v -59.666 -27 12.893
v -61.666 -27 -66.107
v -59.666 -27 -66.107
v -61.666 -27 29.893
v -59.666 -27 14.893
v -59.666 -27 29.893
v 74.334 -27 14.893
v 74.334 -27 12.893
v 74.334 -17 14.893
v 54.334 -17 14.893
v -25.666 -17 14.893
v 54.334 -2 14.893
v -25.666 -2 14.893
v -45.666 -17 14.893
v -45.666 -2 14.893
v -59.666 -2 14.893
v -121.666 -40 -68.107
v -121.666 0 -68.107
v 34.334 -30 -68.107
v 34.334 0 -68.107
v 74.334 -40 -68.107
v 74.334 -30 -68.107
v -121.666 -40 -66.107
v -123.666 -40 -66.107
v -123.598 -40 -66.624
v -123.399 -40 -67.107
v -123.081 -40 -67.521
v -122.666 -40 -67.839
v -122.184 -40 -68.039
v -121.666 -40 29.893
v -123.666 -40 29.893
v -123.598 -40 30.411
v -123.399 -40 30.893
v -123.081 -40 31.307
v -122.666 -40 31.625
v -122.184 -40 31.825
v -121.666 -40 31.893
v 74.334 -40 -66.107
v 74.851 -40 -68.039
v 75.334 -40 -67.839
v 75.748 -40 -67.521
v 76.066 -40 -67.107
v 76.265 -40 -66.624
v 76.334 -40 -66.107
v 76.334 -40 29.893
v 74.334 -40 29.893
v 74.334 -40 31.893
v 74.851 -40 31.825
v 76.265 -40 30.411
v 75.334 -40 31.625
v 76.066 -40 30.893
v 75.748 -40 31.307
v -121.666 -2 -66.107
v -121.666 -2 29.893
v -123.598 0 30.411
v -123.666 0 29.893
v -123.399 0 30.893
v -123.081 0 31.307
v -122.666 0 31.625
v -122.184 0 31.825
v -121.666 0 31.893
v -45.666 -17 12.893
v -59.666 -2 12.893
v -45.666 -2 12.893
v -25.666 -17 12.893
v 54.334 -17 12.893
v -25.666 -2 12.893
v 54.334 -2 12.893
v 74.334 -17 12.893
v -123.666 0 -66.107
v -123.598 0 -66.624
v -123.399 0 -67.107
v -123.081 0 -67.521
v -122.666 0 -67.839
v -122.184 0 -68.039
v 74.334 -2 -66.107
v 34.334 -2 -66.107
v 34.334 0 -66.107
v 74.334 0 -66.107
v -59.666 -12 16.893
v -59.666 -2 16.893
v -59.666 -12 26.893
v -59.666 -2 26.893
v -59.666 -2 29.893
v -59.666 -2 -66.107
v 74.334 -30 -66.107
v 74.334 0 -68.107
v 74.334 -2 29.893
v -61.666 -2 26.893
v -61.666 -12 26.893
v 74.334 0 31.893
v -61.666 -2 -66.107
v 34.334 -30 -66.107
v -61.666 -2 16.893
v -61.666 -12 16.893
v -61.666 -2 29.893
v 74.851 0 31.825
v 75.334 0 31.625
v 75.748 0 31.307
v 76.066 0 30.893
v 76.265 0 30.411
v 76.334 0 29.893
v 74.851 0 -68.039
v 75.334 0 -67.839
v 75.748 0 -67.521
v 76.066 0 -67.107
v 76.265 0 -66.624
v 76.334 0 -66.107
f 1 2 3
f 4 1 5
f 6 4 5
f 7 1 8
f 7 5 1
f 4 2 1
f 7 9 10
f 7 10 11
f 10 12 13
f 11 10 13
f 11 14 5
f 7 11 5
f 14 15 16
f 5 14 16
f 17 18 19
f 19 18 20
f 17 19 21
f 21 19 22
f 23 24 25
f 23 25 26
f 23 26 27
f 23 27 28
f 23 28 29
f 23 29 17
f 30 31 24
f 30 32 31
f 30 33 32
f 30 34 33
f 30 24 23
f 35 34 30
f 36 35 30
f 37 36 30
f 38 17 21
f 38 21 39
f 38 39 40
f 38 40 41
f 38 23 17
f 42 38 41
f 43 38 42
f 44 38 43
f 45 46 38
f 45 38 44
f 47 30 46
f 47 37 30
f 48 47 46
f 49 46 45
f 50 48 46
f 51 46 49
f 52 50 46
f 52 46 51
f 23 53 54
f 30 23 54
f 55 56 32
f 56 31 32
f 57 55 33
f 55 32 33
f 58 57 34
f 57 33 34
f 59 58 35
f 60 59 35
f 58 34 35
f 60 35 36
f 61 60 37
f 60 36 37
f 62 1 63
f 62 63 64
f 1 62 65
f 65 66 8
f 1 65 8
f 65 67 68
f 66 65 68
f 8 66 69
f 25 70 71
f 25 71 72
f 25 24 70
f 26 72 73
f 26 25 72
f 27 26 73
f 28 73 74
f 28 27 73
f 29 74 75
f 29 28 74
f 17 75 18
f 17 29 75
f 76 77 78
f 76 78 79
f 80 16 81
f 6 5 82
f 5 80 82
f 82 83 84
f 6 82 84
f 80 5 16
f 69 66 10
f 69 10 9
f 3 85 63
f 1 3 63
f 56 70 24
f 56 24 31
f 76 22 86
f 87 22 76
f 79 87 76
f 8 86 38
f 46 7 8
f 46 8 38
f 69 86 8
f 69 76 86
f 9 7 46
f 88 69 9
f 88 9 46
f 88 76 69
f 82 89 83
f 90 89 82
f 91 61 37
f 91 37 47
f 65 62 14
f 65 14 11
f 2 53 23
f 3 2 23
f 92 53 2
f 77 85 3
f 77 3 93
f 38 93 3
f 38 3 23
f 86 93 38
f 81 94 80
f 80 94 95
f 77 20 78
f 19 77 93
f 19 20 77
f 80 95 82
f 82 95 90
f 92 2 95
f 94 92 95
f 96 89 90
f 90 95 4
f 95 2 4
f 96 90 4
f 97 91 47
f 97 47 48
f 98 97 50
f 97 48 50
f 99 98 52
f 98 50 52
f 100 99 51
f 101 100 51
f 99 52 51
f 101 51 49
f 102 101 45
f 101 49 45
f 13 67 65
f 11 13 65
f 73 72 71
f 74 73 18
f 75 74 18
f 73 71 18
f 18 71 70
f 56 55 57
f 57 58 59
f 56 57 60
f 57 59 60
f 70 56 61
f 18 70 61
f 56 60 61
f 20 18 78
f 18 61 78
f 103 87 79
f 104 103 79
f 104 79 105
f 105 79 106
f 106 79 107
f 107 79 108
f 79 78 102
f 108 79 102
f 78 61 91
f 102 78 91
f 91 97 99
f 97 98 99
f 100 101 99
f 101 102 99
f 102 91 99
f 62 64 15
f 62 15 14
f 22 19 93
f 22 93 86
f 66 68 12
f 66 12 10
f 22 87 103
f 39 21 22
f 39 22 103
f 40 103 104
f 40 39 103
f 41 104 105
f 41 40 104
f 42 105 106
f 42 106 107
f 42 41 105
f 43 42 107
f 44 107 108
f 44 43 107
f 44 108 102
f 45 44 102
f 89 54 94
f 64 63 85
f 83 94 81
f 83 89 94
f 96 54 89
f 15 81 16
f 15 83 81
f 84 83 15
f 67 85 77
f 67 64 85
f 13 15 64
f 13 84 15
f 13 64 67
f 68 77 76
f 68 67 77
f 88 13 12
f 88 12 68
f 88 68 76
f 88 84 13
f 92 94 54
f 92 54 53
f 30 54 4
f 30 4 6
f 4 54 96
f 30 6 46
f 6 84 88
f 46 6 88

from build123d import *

# Parameters (mm, degrees)
F0_W      = 200
F0_H      = 100
F0_W_2    = 196
F0_H_2    = 96
F1_DEPTH  = 40
F2_DEPTH  = 2
F3_W      = 62
F3_H      = 96
F4_DEPTH  = 25
F5_W      = 60
F5_H      = 96
F6_DEPTH  = 25
F8_DEPTH  = 25
F9_W      = 14
F9_H      = 10
F10_DEPTH = 5
F12_W     = 10
F12_H     = 10
F13_DEPTH = 5
F14_R     = 2
F15_W     = 20
F15_H     = 15
F16_DEPTH = 2
F17_W     = 15
F17_H     = 10
F18_DEPTH = 2
F19_W     = 86
F19_H     = 2
F20_DEPTH = 25
F21_W     = 25
F21_H     = 15
F22_DEPTH = 88
F23_W     = 40
F23_H     = 30
F24_DEPTH = 2
F25_W     = 20
F25_H     = 15
F26_DEPTH = 2


with BuildPart() as f1:
    # F0 (on Front) → F1 (new body)
    with BuildSketch(Plane.XZ):
        with Locations((-23.666499, -18.106852)):
            Rectangle(F0_W, F0_H)
        with Locations((-23.666499, -18.106852)):
            Rectangle(F0_W_2, F0_H_2, mode=Mode.SUBTRACT)
    extrude(amount=F1_DEPTH)

    # F0 (on Front) → F2 (join)
    with BuildSketch(Plane.XZ):
        with Locations((-23.666499, -18.106852)):
            Rectangle(F0_W_2, F0_H_2)
    extrude(amount=F2_DEPTH)

    # F3 (on face) → F4 (join)
    with BuildSketch(Plane.XZ.offset(2)):
        with Locations((-90.666499, -18.106852)):
            Rectangle(F3_W, F3_H)
    extrude(amount=F4_DEPTH)

    # F5 (on face) → F6 (cut)
    with BuildSketch(Plane.XZ.offset(27)):
        with Locations((-91.666499, -18.106852)):
            Rectangle(F5_W, F5_H)
    extrude(amount=-F6_DEPTH, mode=Mode.SUBTRACT)

    # F7 (on face) → F8 (join)
    with BuildSketch(Plane.XZ.offset(2)):
        Polygon((-11.666499, 29.893148), (-13.666499, 29.893148), (-13.666499, 14.893148), (-59.666499, 14.893148), (-59.666499, 12.893148), (-11.666499, 12.893148), align=None)
    extrude(amount=F8_DEPTH)

    # F9 (on face) → F10 (cut)
    with BuildSketch(Plane(origin=(0, 0, 12.893148), x_dir=(1, 0, 0), z_dir=(0, 0, -1))):
        with Locations((0.078483, 7)):
            Rectangle(F9_W, F9_H)
    extrude(amount=-F10_DEPTH, mode=Mode.SUBTRACT)

    # F12 (on face) → F13 (cut)
    with BuildSketch(Plane(origin=(-61.666499, 0, 0), x_dir=(0, -1, 0), z_dir=(-1, 0, 0))):
        with Locations((7, 21.893148)):
            Rectangle(F12_W, F12_H)
    extrude(amount=-F13_DEPTH, mode=Mode.SUBTRACT)

    # F14
    f14_edges = [f1.edges().sort_by_distance(p)[0] for p in [
        (76.333501, -20, -68.106852),
        (76.333501, -20, 31.893148),
        (-123.666499, -20, -68.106852),
        (-123.666499, -20, 31.893148),
    ]]
    fillet(f14_edges, radius=F14_R)

    # F15 (on face) → F16 (cut)
    with BuildSketch(Plane(origin=(0, 0, 12.893148), x_dir=(1, 0, 0), z_dir=(0, 0, -1))):
        with Locations((-35.666499, 9.5)):
            Rectangle(F15_W, F15_H)
    extrude(amount=-F16_DEPTH, mode=Mode.SUBTRACT)

    # F17 (on face) → F18 (cut)
    with BuildSketch(Plane.YZ.offset(-11.666499)):
        with Locations((-9.5, 21.393148)):
            Rectangle(F17_W, F17_H)
    extrude(amount=-F18_DEPTH, mode=Mode.SUBTRACT)

    # F19 (on face) → F20 (join)
    with BuildSketch(Plane.XZ.offset(2)):
        with Locations((31.333501, 13.893148)):
            Rectangle(F19_W, F19_H)
        with Locations((31.333501, 28.893148)):
            Rectangle(F19_W, F19_H)
    extrude(amount=F20_DEPTH)

    # F21 (on face) → F22 (cut)
    with BuildSketch(Plane(origin=(-13.666499, 0, 0), x_dir=(0, -1, 0), z_dir=(-1, 0, 0))):
        with Locations((14.5, 22.393148)):
            Rectangle(F21_W, F21_H)
    extrude(amount=-F22_DEPTH, mode=Mode.SUBTRACT)

    # F23 (on face) → F24 (cut)
    with BuildSketch(Plane(origin=(0, 0, -68.106852), x_dir=(1, 0, 0), z_dir=(0, 0, -1))):
        with Locations((54.333501, 15)):
            Rectangle(F23_W, F23_H)
    extrude(amount=-F24_DEPTH, mode=Mode.SUBTRACT)

    # F25 (on face) → F26 (cut)
    with BuildSketch(Plane(origin=(0, 0, 12.893148), x_dir=(1, 0, 0), z_dir=(0, 0, -1))):
        with Locations((64.333501, 9.5)):
            Rectangle(F25_W, F25_H)
    extrude(amount=-F26_DEPTH, mode=Mode.SUBTRACT)


solid = f1.part
